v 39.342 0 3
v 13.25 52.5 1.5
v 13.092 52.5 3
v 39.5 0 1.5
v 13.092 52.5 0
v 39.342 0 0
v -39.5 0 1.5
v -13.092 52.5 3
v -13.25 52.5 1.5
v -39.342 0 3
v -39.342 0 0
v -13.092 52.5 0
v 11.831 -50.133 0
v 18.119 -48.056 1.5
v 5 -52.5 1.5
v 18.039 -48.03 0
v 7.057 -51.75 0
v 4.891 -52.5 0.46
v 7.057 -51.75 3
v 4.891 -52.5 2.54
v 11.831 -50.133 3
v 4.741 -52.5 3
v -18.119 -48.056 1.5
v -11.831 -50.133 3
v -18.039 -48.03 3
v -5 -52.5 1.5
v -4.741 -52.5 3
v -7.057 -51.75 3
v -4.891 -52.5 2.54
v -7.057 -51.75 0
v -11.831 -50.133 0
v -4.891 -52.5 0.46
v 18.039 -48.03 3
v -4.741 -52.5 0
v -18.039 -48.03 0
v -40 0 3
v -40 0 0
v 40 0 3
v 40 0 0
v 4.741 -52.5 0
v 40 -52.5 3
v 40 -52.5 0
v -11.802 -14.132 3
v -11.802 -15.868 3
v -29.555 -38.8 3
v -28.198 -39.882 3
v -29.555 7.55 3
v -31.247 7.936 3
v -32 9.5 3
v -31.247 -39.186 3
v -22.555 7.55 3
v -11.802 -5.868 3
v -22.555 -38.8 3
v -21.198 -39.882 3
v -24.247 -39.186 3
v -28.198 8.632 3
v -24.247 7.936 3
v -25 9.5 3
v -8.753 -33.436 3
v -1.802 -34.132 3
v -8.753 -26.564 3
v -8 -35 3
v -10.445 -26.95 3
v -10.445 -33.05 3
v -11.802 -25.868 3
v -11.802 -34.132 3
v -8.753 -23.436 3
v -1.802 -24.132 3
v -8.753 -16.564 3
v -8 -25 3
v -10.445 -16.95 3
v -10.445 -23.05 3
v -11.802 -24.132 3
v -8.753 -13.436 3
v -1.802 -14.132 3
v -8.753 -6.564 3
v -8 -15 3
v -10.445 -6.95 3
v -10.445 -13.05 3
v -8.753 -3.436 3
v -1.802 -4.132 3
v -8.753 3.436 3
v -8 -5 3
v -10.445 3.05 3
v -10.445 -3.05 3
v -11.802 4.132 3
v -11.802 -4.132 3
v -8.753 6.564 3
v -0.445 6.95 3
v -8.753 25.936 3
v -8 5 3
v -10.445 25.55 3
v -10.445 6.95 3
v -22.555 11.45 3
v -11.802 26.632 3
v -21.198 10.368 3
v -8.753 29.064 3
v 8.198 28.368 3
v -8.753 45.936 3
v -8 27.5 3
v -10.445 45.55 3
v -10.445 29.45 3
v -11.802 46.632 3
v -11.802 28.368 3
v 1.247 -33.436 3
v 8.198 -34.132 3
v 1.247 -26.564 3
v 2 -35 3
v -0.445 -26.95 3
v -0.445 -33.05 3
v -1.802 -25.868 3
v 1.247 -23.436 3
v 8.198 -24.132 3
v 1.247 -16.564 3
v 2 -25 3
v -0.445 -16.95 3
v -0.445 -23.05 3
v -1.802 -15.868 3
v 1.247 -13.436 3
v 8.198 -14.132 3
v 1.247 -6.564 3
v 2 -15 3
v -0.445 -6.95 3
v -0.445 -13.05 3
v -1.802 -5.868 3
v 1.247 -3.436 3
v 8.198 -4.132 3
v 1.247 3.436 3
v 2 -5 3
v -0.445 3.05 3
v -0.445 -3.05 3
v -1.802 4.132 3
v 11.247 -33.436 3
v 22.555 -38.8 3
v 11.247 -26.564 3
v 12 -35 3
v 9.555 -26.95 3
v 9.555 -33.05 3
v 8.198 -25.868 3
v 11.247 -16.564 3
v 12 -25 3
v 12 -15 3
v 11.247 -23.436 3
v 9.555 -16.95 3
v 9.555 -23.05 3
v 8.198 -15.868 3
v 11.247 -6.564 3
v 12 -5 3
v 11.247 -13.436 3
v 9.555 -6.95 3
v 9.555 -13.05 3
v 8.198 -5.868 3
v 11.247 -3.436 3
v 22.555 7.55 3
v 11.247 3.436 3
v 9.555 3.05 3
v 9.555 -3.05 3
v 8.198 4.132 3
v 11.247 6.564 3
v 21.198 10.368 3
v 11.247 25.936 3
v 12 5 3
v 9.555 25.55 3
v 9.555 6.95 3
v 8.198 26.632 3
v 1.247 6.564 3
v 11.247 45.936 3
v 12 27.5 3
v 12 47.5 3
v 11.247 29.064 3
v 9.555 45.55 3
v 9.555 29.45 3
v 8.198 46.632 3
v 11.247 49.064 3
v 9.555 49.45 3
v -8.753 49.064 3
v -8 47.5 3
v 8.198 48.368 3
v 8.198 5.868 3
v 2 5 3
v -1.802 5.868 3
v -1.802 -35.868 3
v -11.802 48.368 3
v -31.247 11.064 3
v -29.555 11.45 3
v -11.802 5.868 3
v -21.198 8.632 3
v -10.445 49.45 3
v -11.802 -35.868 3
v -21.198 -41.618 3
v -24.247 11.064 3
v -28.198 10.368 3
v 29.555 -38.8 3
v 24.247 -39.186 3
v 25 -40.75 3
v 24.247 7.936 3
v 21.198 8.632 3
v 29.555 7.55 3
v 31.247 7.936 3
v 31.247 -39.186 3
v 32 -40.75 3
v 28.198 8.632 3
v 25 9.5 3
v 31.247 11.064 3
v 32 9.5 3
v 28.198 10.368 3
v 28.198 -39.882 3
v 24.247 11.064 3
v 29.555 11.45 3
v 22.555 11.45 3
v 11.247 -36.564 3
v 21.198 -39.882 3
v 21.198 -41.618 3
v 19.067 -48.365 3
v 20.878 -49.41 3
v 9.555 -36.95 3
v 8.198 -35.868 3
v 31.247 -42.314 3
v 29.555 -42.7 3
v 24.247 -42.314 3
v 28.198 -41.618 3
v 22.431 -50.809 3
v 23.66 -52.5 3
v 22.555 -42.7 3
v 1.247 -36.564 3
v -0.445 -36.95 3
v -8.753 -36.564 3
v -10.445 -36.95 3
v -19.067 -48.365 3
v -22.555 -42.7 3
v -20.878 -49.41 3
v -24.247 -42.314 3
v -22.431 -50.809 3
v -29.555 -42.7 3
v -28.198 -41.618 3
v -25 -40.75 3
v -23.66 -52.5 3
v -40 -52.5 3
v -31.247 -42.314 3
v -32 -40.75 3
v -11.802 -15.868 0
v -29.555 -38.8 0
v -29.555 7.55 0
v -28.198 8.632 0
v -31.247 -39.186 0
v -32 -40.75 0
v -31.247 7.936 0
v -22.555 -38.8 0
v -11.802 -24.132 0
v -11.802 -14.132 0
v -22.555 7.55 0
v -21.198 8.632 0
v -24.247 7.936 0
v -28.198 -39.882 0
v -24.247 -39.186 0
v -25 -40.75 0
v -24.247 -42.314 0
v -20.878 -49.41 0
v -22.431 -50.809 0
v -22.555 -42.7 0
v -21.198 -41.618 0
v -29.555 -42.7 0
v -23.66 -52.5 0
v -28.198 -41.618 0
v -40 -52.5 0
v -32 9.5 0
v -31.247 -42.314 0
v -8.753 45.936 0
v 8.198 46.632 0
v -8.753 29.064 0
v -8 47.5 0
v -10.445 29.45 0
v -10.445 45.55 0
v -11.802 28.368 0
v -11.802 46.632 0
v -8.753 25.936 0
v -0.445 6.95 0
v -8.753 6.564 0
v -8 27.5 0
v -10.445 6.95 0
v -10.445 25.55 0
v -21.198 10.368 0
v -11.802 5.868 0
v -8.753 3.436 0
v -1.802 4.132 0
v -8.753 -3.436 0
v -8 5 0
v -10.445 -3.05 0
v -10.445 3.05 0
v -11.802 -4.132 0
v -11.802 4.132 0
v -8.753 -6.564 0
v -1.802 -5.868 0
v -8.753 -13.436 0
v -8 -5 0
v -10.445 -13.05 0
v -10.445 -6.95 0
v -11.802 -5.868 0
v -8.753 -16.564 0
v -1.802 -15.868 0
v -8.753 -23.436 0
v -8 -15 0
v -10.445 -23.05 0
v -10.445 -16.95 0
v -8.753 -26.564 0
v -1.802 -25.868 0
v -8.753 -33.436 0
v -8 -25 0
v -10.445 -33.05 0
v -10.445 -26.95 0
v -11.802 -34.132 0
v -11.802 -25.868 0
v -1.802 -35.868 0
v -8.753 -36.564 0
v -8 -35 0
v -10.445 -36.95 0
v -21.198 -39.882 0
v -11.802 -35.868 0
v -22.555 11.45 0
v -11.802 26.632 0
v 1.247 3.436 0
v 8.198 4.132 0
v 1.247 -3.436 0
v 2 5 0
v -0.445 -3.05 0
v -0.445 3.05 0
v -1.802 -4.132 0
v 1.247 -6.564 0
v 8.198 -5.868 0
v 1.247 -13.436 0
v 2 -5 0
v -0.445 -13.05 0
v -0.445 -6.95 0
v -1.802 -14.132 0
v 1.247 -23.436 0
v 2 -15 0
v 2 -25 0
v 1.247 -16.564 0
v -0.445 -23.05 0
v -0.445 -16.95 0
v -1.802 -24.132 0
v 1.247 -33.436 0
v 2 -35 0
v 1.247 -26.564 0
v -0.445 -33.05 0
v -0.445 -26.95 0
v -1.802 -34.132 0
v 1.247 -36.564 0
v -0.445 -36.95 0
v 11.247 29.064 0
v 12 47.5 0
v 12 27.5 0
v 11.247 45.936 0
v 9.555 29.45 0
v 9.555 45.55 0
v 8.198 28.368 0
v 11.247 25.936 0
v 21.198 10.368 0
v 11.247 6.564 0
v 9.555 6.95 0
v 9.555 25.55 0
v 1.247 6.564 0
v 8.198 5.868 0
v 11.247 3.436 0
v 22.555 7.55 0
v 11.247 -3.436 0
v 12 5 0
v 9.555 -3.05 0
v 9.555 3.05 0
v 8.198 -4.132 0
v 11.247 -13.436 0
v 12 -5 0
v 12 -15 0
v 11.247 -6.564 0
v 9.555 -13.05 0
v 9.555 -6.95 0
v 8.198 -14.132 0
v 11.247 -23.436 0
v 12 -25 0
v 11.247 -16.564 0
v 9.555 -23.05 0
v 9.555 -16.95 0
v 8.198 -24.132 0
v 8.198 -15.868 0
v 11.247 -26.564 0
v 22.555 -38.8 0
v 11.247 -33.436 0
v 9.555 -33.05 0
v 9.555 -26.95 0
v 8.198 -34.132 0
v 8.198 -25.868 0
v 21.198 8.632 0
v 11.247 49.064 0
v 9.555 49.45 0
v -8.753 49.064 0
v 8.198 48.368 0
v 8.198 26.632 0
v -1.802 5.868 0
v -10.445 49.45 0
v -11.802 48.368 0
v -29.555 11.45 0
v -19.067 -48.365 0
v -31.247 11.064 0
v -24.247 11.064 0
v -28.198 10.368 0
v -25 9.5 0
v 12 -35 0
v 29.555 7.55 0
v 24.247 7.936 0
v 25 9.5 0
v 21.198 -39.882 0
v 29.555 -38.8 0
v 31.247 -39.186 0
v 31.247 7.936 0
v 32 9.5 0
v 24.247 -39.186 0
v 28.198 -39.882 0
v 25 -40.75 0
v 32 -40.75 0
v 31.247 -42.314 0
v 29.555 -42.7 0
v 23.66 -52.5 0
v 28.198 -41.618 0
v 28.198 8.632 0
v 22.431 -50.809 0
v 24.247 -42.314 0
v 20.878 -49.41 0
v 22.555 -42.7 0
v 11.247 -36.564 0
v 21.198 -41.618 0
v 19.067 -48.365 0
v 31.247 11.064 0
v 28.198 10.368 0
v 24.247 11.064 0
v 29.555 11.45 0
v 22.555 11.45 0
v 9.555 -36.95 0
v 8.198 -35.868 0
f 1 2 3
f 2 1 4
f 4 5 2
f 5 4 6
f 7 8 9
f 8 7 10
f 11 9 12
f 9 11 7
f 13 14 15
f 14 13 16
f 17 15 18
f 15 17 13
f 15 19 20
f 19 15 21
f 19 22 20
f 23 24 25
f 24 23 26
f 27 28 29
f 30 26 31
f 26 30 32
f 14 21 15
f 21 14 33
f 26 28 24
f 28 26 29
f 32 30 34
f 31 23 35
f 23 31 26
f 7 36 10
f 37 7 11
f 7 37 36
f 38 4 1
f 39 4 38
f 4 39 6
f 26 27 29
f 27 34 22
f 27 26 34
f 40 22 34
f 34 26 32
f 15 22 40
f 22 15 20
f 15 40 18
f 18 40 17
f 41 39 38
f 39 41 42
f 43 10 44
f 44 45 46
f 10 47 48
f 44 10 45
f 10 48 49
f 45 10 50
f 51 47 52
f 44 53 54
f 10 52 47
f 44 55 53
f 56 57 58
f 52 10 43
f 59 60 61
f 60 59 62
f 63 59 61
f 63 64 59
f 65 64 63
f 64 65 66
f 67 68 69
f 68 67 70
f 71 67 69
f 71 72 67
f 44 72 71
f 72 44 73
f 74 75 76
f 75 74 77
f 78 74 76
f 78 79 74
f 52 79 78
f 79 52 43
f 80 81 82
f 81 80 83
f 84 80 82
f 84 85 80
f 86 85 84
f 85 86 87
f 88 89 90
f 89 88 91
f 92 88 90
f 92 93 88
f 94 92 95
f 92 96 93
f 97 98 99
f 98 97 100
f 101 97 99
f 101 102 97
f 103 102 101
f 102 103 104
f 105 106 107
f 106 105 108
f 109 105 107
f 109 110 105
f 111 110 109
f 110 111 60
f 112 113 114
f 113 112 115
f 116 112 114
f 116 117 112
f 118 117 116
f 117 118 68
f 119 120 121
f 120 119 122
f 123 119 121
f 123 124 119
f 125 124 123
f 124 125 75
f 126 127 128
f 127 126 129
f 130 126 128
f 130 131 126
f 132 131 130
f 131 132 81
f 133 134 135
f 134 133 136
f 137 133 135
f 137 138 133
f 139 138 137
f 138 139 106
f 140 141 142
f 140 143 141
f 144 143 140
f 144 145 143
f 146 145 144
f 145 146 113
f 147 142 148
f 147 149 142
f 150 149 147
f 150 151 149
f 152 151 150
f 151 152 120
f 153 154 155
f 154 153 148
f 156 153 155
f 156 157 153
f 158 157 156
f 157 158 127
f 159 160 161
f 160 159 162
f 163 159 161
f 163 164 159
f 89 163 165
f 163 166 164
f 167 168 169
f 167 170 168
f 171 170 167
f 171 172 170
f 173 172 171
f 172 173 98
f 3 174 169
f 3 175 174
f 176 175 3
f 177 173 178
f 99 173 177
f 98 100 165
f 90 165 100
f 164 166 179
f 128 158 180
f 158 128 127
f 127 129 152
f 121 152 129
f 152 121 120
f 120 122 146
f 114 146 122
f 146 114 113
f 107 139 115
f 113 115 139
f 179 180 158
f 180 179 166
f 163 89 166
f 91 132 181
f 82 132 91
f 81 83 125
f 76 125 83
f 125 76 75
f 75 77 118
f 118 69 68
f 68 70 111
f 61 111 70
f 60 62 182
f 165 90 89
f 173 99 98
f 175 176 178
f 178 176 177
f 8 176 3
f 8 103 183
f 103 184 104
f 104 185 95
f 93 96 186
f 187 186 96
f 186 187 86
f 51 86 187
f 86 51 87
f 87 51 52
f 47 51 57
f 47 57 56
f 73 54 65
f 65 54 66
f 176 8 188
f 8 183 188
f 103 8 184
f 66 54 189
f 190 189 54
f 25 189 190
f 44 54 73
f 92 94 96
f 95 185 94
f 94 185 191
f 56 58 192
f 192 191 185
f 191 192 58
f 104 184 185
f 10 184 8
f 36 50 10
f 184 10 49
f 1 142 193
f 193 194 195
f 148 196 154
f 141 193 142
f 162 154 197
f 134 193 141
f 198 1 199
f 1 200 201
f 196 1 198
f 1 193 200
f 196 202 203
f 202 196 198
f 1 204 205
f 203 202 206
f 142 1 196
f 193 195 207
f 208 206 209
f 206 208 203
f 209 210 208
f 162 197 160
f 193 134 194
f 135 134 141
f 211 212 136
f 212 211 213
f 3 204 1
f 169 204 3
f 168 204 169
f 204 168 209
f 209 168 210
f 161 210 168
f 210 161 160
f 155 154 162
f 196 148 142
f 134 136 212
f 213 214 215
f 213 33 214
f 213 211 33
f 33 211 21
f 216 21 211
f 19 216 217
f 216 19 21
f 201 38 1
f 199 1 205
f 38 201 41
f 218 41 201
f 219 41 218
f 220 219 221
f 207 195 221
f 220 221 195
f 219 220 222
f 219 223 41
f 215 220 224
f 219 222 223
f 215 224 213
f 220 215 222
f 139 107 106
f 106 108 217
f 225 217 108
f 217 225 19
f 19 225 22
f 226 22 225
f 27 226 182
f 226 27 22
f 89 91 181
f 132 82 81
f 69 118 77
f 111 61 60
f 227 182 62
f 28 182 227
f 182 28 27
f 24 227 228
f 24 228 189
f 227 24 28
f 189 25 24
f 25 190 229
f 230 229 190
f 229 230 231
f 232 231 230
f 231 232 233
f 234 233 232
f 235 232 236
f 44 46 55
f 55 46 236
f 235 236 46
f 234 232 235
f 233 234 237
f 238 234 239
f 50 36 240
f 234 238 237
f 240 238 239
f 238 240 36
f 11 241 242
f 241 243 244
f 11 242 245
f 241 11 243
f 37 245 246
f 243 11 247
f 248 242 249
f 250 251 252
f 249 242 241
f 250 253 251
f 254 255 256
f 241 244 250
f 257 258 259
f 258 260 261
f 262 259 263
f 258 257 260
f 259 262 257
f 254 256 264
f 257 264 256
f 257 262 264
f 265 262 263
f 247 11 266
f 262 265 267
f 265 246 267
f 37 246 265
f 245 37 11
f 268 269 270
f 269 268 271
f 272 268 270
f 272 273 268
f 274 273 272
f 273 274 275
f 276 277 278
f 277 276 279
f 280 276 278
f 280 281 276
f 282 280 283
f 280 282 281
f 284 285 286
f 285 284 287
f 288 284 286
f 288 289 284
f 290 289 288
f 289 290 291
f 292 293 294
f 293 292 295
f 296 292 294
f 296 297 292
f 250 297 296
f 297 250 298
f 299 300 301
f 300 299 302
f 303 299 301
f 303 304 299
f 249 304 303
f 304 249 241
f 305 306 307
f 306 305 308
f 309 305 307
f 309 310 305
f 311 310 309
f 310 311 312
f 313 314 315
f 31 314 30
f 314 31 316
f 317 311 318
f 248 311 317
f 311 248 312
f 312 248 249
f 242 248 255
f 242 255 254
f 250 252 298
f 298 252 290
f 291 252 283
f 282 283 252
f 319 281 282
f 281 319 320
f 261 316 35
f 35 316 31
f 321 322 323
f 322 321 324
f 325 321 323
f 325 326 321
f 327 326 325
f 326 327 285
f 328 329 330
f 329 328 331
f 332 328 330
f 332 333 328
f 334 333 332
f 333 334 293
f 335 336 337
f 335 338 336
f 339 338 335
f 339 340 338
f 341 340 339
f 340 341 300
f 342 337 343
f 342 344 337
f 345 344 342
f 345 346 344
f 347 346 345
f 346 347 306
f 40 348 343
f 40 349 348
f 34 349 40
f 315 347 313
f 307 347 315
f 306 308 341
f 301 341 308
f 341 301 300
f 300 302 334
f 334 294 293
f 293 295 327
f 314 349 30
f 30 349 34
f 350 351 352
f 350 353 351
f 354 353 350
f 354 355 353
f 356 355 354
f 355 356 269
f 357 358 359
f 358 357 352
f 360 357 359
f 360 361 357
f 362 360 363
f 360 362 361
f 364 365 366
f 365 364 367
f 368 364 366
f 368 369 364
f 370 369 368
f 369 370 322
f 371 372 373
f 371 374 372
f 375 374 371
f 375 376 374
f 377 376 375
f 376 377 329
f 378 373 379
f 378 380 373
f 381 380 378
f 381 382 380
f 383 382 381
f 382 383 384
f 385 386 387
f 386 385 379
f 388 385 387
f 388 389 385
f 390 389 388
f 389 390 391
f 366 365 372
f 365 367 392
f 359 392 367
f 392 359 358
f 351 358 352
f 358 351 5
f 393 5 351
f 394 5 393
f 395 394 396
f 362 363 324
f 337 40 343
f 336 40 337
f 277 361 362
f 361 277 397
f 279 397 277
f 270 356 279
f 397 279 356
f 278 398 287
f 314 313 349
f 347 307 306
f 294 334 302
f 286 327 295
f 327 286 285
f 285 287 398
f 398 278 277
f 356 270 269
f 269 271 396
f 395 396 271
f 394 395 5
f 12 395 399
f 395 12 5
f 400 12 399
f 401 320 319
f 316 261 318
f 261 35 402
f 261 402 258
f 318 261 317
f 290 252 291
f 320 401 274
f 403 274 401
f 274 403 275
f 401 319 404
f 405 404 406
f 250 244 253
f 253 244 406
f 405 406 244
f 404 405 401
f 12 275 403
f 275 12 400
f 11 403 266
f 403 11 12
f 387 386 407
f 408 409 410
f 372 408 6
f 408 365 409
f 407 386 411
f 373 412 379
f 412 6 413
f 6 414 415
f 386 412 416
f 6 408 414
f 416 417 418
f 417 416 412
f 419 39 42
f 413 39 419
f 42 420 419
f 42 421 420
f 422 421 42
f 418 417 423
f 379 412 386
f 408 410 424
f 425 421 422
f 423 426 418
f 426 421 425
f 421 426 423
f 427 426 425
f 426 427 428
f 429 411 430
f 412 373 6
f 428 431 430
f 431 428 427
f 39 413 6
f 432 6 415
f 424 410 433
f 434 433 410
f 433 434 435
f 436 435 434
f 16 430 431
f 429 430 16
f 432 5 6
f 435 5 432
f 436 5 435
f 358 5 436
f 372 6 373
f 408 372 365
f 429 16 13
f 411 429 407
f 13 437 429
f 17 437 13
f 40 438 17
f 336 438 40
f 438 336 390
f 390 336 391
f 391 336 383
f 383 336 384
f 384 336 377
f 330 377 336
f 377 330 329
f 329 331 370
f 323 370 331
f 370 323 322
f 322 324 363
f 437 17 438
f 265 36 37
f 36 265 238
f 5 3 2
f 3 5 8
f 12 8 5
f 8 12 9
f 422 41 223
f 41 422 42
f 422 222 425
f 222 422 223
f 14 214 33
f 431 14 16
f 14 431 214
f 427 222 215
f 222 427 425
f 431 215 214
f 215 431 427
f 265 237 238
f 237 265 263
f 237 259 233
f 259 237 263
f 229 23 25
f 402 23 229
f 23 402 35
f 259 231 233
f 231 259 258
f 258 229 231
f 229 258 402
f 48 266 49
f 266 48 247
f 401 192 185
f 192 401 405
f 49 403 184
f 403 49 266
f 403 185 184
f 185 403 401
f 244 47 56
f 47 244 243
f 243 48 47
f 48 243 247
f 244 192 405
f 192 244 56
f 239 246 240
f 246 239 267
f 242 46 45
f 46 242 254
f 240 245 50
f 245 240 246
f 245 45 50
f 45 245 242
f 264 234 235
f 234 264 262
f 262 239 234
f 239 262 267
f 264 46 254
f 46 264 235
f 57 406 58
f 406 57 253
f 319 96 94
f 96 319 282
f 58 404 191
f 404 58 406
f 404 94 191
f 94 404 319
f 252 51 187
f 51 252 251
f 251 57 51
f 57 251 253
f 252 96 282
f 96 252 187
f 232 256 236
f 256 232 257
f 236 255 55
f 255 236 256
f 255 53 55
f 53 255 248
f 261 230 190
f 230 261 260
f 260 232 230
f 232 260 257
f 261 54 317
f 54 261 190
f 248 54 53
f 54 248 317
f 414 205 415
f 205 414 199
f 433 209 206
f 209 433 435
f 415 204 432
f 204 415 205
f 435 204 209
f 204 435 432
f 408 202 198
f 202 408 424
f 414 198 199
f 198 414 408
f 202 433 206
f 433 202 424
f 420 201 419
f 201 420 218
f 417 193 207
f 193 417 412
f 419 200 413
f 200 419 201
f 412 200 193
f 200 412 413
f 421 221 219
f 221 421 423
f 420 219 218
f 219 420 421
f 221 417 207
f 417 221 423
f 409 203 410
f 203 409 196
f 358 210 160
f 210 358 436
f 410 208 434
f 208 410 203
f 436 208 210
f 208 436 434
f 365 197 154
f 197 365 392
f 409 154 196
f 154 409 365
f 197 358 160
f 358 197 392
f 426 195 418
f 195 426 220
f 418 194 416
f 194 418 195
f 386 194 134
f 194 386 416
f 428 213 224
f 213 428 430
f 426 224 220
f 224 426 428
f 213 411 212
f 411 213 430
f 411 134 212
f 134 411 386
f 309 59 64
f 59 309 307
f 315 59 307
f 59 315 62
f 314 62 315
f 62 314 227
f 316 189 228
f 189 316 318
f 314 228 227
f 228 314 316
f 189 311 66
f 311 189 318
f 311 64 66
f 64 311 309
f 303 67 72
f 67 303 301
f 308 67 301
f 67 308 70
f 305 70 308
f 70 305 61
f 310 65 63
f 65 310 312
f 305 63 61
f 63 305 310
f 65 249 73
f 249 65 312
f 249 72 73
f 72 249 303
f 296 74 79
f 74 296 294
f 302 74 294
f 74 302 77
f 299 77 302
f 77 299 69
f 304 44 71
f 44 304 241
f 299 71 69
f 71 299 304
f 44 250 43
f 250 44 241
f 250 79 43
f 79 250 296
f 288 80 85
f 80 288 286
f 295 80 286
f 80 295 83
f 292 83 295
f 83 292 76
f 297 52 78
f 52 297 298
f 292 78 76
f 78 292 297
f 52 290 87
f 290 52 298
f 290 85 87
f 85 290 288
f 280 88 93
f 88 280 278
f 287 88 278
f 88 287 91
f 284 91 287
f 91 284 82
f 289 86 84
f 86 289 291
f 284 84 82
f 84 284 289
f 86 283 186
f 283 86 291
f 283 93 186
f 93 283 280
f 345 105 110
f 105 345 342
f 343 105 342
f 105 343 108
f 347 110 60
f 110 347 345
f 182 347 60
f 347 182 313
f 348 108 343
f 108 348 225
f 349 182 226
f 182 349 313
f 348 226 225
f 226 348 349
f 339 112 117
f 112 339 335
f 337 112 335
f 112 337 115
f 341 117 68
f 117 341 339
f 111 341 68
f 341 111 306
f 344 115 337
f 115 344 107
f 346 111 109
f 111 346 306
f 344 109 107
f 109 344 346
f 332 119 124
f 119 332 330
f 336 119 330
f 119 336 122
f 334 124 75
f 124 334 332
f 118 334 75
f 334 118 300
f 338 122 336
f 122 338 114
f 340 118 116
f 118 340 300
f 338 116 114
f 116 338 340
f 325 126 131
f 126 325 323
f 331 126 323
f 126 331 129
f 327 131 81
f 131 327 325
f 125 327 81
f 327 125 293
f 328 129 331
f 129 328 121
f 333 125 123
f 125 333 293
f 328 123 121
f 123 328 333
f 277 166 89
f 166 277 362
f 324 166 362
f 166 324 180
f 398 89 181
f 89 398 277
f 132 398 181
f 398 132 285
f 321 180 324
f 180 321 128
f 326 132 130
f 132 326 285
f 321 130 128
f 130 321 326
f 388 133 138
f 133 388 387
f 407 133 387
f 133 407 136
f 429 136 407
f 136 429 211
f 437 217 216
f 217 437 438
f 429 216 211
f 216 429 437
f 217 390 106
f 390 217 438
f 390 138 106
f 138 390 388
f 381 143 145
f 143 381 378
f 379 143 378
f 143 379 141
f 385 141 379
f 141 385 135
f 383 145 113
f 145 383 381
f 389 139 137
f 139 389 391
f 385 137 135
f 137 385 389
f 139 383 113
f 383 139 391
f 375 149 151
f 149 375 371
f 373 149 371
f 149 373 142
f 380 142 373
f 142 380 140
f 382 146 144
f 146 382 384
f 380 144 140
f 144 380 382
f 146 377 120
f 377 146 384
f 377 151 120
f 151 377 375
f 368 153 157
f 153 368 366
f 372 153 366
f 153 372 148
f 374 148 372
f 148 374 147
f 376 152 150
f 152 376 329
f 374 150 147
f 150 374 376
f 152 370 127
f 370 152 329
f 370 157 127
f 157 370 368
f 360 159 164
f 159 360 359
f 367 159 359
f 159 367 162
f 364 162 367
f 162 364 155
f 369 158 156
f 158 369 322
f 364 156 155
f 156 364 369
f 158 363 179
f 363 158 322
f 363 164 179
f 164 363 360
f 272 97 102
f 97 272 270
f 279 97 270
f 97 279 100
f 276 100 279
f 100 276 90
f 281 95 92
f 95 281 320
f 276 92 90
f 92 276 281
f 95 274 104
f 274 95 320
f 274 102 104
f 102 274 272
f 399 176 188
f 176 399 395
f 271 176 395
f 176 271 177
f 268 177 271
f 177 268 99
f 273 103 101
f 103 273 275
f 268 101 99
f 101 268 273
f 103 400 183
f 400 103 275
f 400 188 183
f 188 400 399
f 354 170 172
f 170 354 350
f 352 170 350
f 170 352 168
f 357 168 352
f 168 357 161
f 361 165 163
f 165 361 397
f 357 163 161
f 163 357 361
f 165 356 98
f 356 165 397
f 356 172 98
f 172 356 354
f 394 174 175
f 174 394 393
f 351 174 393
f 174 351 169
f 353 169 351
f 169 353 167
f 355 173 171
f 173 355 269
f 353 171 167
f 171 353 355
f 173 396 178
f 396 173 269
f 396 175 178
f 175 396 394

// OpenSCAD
thickness = 3;
length = 105;
width = 80;

//servoHeight = 42.8;
//boxHeight = 31.8;
//mountHeight = (servoHeight - boxHeight)/2;
mountHeight = 6;
servoWidth = 16;
centerToCenter = 48.25;
flushOffset = 2.5;

holeDiameter = 4;

difference() {

	union() {
		intersection() {

			// Create two cones on their sides, with the thick section touching.
			//
			union() {
				translate([0,0,thickness/2]) {
					rotate([90,0,0])
						translate([0,0,length/-1.5+1])
							cylinder(r1=5, r2=width/2, h=length/1.5);
	
					rotate([270,0,0])
						translate([0,0,length/-2])
							cylinder(r1=5, r2=width*2, h=length/2);
				}
			}
	 		// Slice a layer off the cones, leaving just a flat polygon
		    	//
			translate([width/-2, length/-2, 0])
				cube([width, length, thickness]);

		}

		for (i = [0, 1]) {

			mirror([ i, 0, 0 ]) // do the same thing on each side
				union() {

					// Tapered decorative stuff on the rear
					//
					translate([width/2 - 25, length/-2, 0]) difference() 
					{
						cube([25, 12.5, thickness]); // drop in a cube
						rotate([0,0,90]) translate([-5,0,thickness/-2])
							cylinder(r=10, h=thickness*2); // carve a circular portion
					}

			}
		}
	}



	// Bracket mounts
	//
	for (l = [0, 1]) {

		mirror([ l, 0, 0 ]) // do the same thing on each side

			translate([5, mountHeight/-2 + 12.5, servoWidth/4 + thickness])
				rotate([0,90,0])
					for(i = [0, 7]) {
						for (j = [0, centerToCenter * -1 - 2]) { // go front to back
							translate([0, j, i])
								rotate([0, 90, 0]) translate([width/2 - 5,0,thickness])
									#cylinder(r=holeDiameter/2, h=thickness * 2);
						}
					}
	}

	// Swiss cheesing
    for (i = [-10, 0, 10, ]) {
      for (j = [-35, -25,-15, -5, 5]) {
         translate([i, j, thickness/-2])
           #cylinder(r=holeDiameter/2, h=thickness*2);
      } 
    }

	translate([0, length/2-15, thickness/-2])
		for (i = [-10, 10]) {
			for (j = [-10, 10]) {
		         translate([i, j, 0])
	    		       #cylinder(r=holeDiameter/2, h=thickness*2);
			}
		}



}
